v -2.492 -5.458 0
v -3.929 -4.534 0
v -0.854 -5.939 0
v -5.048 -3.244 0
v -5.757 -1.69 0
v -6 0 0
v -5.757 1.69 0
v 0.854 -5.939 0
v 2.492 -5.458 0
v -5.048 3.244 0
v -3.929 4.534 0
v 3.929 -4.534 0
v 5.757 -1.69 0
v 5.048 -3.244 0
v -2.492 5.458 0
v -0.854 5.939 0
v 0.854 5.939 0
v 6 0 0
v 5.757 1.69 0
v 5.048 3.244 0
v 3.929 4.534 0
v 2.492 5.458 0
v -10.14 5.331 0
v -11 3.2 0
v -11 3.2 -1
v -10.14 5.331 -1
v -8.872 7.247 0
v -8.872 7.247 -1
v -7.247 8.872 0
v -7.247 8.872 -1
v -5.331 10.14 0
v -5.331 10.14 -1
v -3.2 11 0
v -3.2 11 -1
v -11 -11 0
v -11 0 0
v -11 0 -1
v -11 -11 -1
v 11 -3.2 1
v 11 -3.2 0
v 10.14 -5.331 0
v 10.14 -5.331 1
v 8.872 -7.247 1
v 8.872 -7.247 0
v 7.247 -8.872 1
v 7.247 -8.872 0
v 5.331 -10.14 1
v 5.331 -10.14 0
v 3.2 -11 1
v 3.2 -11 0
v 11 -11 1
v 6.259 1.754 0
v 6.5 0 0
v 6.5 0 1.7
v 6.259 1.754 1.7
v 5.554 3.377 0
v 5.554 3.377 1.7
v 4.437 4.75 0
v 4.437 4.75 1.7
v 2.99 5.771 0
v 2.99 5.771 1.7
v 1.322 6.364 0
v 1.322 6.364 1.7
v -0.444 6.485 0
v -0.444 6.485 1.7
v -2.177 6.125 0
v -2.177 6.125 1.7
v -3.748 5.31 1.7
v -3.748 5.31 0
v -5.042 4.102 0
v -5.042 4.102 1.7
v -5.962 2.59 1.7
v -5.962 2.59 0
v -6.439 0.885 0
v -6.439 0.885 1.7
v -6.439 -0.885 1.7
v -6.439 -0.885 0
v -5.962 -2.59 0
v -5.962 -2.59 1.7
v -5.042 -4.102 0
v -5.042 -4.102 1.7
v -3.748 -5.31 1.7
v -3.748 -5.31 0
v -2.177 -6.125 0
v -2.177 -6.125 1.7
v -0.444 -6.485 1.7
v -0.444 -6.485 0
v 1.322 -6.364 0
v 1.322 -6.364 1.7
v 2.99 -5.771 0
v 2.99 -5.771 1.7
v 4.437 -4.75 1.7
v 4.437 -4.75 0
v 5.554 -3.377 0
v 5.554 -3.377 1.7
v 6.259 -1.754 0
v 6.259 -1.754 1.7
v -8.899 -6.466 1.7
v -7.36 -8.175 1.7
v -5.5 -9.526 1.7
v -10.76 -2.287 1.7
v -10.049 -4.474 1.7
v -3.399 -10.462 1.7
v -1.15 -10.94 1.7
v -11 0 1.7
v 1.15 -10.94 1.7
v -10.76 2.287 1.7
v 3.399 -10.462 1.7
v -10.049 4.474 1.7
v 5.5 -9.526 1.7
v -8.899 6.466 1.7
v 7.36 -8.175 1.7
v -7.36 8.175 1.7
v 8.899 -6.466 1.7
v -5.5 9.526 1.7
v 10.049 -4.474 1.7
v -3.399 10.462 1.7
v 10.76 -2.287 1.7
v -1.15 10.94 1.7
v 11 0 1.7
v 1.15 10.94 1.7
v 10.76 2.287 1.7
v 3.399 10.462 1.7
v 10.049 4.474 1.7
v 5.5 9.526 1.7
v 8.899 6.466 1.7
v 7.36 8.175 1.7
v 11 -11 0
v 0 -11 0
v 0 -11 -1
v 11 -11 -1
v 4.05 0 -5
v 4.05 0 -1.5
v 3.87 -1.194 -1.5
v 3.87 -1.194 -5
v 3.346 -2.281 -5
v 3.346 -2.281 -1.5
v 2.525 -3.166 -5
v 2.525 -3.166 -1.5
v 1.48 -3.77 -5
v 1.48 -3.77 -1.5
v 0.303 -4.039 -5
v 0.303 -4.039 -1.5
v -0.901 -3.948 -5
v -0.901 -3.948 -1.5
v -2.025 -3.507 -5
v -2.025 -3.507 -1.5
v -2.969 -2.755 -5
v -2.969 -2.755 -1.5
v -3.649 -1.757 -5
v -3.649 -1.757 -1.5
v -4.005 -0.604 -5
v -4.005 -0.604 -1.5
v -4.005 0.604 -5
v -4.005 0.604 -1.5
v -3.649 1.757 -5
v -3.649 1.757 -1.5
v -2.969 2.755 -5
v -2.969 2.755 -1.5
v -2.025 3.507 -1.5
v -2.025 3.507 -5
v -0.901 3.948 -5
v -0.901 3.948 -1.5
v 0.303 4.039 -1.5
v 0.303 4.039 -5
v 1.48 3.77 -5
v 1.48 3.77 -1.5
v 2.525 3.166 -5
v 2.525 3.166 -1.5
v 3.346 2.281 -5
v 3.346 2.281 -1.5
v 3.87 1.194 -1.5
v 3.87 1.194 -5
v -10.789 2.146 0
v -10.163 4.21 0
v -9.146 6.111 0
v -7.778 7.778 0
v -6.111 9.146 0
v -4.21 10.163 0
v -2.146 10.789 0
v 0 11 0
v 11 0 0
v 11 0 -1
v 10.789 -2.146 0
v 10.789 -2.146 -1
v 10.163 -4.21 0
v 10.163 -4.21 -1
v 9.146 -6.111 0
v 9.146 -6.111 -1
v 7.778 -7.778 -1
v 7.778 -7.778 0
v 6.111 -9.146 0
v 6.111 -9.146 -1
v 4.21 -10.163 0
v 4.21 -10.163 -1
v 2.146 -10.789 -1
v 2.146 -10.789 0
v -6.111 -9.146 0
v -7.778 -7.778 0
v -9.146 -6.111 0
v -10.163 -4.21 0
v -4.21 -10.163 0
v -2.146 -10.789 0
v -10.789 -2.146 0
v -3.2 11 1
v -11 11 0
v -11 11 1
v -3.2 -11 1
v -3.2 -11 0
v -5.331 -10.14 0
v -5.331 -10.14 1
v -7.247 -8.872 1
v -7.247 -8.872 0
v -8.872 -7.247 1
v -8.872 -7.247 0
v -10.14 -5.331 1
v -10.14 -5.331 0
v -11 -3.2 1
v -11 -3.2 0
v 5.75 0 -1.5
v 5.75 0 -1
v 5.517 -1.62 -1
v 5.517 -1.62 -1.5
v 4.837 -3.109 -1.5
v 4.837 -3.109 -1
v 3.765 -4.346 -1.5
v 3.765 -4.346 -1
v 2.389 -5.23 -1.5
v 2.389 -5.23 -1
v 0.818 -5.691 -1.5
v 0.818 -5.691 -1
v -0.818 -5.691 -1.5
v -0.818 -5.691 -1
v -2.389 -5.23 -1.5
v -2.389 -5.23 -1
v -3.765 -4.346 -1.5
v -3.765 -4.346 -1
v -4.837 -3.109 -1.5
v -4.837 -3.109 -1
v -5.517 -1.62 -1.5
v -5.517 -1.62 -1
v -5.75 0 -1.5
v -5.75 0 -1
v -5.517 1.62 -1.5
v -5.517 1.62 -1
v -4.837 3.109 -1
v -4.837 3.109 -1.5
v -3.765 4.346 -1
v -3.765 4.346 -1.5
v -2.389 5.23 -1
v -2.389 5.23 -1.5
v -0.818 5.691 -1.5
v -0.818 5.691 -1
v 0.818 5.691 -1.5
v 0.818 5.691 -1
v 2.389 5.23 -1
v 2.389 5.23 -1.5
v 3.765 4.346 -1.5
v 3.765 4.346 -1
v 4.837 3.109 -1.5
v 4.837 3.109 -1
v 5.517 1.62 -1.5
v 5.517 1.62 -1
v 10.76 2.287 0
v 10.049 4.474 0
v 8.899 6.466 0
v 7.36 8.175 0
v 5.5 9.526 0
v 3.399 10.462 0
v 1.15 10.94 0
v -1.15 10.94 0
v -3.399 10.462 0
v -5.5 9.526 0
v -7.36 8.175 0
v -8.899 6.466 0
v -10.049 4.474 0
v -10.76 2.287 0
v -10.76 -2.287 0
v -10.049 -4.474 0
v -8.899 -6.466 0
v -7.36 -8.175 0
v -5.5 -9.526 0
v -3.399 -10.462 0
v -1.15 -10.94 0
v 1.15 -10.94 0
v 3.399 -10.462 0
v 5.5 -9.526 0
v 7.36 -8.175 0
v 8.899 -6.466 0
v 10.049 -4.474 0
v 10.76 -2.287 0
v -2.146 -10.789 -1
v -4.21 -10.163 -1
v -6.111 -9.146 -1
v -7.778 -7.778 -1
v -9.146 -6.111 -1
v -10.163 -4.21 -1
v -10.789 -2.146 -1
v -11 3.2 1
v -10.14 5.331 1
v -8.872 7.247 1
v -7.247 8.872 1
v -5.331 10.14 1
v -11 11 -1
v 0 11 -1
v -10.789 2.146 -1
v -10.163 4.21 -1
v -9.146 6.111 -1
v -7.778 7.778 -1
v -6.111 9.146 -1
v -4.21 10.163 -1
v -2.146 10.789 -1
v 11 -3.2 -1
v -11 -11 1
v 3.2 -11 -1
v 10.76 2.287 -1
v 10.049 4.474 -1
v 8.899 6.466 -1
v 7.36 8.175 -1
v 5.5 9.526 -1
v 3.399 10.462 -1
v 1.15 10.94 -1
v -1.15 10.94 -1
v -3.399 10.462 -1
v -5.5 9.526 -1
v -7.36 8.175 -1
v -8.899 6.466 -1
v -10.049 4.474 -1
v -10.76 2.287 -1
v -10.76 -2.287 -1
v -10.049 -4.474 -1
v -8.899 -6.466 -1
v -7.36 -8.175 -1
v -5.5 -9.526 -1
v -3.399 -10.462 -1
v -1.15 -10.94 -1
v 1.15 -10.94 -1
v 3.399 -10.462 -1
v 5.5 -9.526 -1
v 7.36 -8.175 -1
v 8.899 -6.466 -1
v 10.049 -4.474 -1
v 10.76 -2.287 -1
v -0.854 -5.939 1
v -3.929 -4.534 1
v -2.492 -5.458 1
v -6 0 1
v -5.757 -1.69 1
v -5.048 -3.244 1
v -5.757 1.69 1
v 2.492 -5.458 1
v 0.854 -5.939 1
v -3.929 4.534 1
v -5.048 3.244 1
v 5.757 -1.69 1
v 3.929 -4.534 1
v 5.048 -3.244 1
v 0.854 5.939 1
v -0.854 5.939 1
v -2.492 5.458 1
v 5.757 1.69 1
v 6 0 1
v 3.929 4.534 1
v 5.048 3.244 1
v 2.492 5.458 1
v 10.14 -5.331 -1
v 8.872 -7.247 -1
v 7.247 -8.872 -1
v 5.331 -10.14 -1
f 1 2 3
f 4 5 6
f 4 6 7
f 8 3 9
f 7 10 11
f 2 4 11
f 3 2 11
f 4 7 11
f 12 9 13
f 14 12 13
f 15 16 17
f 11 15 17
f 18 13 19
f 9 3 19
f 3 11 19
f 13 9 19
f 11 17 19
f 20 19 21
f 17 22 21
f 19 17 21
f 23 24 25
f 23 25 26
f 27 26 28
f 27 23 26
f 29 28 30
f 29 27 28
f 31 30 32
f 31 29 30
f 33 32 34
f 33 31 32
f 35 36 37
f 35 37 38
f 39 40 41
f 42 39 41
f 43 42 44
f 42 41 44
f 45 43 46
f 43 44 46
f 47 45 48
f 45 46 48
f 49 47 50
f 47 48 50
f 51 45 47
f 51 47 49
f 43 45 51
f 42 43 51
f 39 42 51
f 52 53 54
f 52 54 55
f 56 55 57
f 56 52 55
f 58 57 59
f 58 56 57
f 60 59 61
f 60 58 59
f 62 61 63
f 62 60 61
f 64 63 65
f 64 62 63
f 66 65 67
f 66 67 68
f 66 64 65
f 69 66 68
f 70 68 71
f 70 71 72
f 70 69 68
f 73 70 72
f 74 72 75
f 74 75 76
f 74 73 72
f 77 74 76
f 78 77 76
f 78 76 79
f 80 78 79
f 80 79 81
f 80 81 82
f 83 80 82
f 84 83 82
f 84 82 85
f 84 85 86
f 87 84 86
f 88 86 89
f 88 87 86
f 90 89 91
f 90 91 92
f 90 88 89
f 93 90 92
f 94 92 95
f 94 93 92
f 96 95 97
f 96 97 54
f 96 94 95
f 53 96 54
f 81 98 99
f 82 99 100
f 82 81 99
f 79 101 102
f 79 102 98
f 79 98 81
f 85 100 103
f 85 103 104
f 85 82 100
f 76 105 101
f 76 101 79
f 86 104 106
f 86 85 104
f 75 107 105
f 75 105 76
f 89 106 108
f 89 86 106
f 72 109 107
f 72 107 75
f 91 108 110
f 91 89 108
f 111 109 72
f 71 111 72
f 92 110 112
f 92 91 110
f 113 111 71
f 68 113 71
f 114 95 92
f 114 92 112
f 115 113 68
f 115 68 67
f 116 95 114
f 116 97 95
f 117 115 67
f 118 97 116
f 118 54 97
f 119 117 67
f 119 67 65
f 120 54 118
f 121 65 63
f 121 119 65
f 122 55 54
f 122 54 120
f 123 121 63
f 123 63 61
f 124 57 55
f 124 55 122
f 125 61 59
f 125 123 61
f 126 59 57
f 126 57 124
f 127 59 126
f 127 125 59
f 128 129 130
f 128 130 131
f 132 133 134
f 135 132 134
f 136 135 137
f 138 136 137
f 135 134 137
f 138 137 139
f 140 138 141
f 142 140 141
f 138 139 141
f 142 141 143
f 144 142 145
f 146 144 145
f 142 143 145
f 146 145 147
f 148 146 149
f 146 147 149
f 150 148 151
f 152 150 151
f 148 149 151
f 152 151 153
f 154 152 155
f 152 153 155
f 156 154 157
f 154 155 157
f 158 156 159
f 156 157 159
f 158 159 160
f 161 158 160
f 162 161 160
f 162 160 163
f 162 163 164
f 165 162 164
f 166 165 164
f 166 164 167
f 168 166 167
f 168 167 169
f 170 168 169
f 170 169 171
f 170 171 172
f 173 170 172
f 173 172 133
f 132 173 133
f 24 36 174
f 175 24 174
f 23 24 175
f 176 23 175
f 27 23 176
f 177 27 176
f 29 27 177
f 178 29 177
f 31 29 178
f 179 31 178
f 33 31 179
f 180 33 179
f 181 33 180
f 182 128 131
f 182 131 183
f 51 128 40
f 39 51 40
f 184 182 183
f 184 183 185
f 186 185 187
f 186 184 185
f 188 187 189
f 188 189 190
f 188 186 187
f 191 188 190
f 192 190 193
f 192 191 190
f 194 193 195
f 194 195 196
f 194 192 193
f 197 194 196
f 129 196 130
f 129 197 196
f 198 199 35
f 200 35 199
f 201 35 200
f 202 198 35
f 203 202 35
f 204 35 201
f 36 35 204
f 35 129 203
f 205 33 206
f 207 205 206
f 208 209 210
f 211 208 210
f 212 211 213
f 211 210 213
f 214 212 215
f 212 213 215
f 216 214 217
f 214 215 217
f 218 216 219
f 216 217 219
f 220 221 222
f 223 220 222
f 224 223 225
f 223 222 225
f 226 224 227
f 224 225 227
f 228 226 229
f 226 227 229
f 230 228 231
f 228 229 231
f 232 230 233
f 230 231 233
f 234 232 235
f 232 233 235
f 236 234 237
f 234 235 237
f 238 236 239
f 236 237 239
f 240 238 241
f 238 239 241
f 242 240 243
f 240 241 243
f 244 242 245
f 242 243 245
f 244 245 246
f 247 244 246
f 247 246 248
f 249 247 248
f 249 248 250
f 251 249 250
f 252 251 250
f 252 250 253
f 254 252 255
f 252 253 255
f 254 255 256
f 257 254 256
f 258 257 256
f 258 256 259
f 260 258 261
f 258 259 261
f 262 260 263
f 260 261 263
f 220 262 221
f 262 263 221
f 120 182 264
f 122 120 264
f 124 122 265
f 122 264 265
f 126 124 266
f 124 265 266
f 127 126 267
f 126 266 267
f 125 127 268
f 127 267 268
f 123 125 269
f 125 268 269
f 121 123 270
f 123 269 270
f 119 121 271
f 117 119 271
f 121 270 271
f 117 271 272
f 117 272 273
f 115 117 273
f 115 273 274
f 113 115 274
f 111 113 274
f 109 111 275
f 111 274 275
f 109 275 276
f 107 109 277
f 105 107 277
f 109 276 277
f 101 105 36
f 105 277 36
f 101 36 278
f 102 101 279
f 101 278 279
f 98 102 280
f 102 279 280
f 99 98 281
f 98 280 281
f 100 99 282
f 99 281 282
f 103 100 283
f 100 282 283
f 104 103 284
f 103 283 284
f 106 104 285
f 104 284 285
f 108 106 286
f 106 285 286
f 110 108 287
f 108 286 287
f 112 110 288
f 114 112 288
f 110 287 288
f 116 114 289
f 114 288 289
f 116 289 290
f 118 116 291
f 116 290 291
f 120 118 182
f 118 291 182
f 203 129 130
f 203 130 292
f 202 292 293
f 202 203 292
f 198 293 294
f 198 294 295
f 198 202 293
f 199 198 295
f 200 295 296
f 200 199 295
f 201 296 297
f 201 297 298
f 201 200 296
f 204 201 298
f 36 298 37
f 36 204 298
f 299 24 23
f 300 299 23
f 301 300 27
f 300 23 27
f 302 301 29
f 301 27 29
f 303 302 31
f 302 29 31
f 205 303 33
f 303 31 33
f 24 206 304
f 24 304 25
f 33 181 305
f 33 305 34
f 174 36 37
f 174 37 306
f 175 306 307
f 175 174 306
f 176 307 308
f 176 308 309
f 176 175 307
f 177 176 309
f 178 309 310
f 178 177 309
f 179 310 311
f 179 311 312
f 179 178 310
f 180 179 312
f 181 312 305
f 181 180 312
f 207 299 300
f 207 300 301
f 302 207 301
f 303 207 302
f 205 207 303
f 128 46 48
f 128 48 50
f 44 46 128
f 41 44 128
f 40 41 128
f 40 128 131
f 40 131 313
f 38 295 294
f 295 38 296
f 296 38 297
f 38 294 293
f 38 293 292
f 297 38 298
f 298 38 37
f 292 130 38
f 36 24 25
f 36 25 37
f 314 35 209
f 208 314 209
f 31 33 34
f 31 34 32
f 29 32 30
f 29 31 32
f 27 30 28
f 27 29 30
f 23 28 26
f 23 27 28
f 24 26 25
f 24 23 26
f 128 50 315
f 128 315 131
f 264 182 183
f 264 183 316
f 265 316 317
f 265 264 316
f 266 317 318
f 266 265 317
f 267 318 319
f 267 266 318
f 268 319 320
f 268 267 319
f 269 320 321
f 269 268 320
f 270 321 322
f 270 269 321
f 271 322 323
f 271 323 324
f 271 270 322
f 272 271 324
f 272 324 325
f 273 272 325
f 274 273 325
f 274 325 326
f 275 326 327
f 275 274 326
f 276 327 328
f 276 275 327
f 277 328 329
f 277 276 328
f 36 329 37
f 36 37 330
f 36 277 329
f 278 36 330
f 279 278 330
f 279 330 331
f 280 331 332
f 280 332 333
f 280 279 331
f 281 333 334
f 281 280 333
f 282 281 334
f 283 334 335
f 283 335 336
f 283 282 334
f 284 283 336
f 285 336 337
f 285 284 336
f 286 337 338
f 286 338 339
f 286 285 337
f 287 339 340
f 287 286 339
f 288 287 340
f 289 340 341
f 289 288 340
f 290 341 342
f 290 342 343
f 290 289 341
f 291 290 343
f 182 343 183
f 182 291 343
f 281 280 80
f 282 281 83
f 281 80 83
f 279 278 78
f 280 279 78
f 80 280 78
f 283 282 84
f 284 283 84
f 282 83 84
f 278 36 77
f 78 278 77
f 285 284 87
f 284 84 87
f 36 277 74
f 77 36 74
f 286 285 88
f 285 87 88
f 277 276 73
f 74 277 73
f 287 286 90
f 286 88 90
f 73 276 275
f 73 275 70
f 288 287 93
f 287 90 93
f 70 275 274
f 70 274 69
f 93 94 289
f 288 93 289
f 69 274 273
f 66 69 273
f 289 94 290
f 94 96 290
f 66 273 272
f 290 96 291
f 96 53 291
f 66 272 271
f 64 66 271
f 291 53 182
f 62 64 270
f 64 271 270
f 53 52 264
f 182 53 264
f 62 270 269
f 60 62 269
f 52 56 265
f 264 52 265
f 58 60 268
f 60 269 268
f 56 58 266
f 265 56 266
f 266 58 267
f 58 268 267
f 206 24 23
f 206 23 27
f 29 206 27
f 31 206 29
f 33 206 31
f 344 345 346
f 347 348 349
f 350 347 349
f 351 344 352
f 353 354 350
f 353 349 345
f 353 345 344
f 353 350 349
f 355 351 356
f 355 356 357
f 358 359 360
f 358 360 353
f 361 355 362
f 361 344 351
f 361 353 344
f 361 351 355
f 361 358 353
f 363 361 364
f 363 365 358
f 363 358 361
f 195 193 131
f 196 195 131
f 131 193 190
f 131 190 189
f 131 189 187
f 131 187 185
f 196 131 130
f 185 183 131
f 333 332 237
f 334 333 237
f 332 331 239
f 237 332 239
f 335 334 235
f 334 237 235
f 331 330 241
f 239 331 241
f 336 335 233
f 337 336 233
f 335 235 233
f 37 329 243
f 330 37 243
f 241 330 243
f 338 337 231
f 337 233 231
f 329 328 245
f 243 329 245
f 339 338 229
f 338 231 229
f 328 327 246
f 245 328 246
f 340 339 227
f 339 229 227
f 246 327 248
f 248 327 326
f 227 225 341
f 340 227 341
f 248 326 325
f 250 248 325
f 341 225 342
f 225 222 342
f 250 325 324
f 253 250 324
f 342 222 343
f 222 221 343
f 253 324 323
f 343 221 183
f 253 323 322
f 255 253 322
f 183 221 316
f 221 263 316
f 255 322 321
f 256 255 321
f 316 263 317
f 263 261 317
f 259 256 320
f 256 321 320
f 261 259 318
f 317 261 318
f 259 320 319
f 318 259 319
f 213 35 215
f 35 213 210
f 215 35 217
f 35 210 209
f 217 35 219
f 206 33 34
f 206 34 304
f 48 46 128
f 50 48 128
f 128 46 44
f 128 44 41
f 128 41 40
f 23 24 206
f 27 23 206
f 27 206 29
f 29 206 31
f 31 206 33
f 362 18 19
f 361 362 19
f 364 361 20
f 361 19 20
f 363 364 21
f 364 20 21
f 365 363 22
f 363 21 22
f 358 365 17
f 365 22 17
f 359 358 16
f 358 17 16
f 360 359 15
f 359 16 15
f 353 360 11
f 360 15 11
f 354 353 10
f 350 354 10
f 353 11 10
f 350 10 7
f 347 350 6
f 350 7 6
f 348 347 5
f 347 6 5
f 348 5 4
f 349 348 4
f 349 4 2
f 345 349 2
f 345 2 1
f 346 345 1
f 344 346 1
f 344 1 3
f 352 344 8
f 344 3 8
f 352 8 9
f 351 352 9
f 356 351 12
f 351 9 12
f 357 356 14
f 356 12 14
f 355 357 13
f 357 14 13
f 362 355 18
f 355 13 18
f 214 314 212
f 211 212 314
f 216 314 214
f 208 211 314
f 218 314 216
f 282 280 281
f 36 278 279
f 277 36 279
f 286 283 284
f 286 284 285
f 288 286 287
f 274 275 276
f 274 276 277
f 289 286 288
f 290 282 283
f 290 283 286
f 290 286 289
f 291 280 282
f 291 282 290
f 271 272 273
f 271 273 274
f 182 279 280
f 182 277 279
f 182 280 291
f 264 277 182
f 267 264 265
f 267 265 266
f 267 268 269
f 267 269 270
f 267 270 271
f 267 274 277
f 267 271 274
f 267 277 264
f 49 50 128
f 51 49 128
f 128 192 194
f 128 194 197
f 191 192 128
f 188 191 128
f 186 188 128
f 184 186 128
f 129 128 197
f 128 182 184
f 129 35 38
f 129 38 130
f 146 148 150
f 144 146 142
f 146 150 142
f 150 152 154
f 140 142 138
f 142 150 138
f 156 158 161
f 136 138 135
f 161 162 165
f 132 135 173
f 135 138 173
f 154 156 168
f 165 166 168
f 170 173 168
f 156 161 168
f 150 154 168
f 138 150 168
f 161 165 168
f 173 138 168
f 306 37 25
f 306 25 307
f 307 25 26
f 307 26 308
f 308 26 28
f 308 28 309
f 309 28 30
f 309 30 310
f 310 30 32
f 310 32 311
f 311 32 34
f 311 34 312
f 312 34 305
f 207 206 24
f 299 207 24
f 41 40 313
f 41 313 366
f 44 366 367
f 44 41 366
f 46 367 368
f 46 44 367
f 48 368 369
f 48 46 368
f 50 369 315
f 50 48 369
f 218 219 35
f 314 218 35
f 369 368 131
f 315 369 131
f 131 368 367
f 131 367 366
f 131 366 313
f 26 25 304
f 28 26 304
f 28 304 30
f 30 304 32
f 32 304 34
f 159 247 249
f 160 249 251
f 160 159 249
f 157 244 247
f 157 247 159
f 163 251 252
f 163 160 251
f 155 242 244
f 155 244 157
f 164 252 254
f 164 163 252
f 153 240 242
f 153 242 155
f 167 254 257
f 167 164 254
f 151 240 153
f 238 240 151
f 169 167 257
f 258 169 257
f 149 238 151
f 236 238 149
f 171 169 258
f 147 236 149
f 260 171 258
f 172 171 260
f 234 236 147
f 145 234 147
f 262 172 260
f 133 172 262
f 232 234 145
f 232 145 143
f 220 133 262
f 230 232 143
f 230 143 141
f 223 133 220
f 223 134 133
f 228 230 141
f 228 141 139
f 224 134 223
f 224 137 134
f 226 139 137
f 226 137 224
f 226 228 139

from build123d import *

# Parameters (mm, degrees)
F0_R     = 11
F0_R_2   = 6.5
F1_DEPTH = 1.7
F2_DEPTH = 1
F0_R_3   = 6
F4_DEPTH = 1
F5_R     = 5.75
F5_R_2   = 4.05
F6_DEPTH = 0.5
F7_DEPTH = 4


with BuildPart() as f1:
    # F0 (on Top) → F1 (new body)
    with BuildSketch(Plane.XY):
        Circle(F0_R)
        Circle(F0_R_2, mode=Mode.SUBTRACT)
    extrude(amount=F1_DEPTH)


with BuildPart() as f2:
    # F0 (on Top) → F2 (new body)
    with BuildSketch(Plane.XY):
        with BuildLine():
            Line((-11, 11), (-11, 3.1997503247))
            ThreePointArc((-11, 3.1997503247), (-8.1005679474, 8.1005679474), (-3.1997503247, 11))
            Line((-3.1997503247, 11), (-11, 11))
        make_face()
    extrude(amount=F2_DEPTH)


with BuildPart() as f2b:
    # F0 (on Top) → F2, piece 2 (new body)
    with BuildSketch(Plane.XY):
        Circle(F0_R_3)
    extrude(amount=F2_DEPTH)


with BuildPart() as f2c:
    # F0 (on Top) → F2, piece 3 (new body)
    with BuildSketch(Plane.XY):
        with BuildLine():
            ThreePointArc((-3.1997503247, -11), (-8.1005679474, -8.1005679474), (-11, -3.1997503247))
            Line((-11, -3.1997503247), (-11, -11))
            Line((-11, -11), (-3.1997503247, -11))
        make_face()
    extrude(amount=F2_DEPTH)


with BuildPart() as f2d:
    # F0 (on Top) → F2, piece 4 (new body)
    with BuildSketch(Plane.XY):
        with BuildLine():
            ThreePointArc((11, -3.1997503247), (8.1005679474, -8.1005679474), (3.1997503247, -11))
            Line((3.1997503247, -11), (11, -11))
            Line((11, -11), (11, -3.1997503247))
        make_face()
    extrude(amount=F2_DEPTH)


with BuildPart() as f4:
    # F0 (on Top) → F4 (new body)
    with BuildSketch(Plane.XY):
        with BuildLine():
            Line((-11, 11), (-11, 3.1997503247))
            ThreePointArc((-11, 3.1997503247), (-8.1005679474, 8.1005679474), (-3.1997503247, 11))
            Line((-3.1997503247, 11), (-11, 11))
        make_face()
    extrude(amount=-F4_DEPTH)


with BuildPart() as f4b:
    # F0 (on Top) → F4, piece 2 (new body)
    with BuildSketch(Plane.XY):
        Circle(F0_R)
        Circle(F0_R_2, mode=Mode.SUBTRACT)
        Circle(F0_R_2)
        Circle(F0_R_3, mode=Mode.SUBTRACT)
        Circle(F0_R_3)
    extrude(amount=-F4_DEPTH)

    # F5 (on face) → F6 (join)
    with BuildSketch(Plane(origin=(0, 0, -1), x_dir=(1, 0, 0), z_dir=(0, 0, -1))):
        Circle(F5_R)
        Circle(F5_R_2, mode=Mode.SUBTRACT)
    extrude(amount=F6_DEPTH)

    # F7 (add): a face of the model
    f7_faces = [f4b.faces().sort_by_distance(p)[0] for p in [
        (0, 0, -1),
    ]]
    extrude(f7_faces, amount=F7_DEPTH)


with BuildPart() as f4c:
    # F0 (on Top) → F4, piece 3 (new body)
    with BuildSketch(Plane.XY):
        with BuildLine():
            ThreePointArc((11, -3.1997503247), (8.1005679474, -8.1005679474), (3.1997503247, -11))
            Line((3.1997503247, -11), (11, -11))
            Line((11, -11), (11, -3.1997503247))
        make_face()
    extrude(amount=-F4_DEPTH)


with BuildPart() as f4d:
    # F3 (on face) → F4, piece 4 (new body)
    with BuildSketch(Plane.XY):
        with BuildLine():
            Line((-11, 3.1997503247), (-11, 0))
            ThreePointArc((-11, 0), (-7.7781745931, 7.7781745931), (0, 11))
            Line((0, 11), (-3.1997503247, 11))
            ThreePointArc((-3.1997503247, 11), (-8.1005679474, 8.1005679474), (-11, 3.1997503247))
        make_face()
    extrude(amount=-F4_DEPTH)


with BuildPart() as f4e:
    # F3 (on face) → F4, piece 5 (new body)
    with BuildSketch(Plane.XY):
        with BuildLine():
            Line((-3.1997503247, -11), (0, -11))
            ThreePointArc((0, -11), (-7.7781745931, -7.7781745931), (-11, 0))
            Line((-11, 0), (-11, -3.1997503247))
            Line((-11, -3.1997503247), (-11, -11))
            Line((-11, -11), (-3.1997503247, -11))
        make_face()
    extrude(amount=-F4_DEPTH)


with BuildPart() as f4f:
    # F3 (on face) → F4, piece 6 (new body)
    with BuildSketch(Plane.XY):
        with BuildLine():
            Line((0, -11), (3.1997503247, -11))
            Line((3.1997503247, -11), (11, -11))
            Line((11, -11), (11, -3.1997503247))
            Line((11, -3.1997503247), (11, 0))
            ThreePointArc((11, 0), (7.7781745931, -7.7781745931), (0, -11))
        make_face()
    extrude(amount=-F4_DEPTH)


solid = Compound([f1.part, f2.part, f2b.part, f2c.part, f2d.part, f4.part, f4b.part, f4c.part, f4d.part, f4e.part, f4f.part])
